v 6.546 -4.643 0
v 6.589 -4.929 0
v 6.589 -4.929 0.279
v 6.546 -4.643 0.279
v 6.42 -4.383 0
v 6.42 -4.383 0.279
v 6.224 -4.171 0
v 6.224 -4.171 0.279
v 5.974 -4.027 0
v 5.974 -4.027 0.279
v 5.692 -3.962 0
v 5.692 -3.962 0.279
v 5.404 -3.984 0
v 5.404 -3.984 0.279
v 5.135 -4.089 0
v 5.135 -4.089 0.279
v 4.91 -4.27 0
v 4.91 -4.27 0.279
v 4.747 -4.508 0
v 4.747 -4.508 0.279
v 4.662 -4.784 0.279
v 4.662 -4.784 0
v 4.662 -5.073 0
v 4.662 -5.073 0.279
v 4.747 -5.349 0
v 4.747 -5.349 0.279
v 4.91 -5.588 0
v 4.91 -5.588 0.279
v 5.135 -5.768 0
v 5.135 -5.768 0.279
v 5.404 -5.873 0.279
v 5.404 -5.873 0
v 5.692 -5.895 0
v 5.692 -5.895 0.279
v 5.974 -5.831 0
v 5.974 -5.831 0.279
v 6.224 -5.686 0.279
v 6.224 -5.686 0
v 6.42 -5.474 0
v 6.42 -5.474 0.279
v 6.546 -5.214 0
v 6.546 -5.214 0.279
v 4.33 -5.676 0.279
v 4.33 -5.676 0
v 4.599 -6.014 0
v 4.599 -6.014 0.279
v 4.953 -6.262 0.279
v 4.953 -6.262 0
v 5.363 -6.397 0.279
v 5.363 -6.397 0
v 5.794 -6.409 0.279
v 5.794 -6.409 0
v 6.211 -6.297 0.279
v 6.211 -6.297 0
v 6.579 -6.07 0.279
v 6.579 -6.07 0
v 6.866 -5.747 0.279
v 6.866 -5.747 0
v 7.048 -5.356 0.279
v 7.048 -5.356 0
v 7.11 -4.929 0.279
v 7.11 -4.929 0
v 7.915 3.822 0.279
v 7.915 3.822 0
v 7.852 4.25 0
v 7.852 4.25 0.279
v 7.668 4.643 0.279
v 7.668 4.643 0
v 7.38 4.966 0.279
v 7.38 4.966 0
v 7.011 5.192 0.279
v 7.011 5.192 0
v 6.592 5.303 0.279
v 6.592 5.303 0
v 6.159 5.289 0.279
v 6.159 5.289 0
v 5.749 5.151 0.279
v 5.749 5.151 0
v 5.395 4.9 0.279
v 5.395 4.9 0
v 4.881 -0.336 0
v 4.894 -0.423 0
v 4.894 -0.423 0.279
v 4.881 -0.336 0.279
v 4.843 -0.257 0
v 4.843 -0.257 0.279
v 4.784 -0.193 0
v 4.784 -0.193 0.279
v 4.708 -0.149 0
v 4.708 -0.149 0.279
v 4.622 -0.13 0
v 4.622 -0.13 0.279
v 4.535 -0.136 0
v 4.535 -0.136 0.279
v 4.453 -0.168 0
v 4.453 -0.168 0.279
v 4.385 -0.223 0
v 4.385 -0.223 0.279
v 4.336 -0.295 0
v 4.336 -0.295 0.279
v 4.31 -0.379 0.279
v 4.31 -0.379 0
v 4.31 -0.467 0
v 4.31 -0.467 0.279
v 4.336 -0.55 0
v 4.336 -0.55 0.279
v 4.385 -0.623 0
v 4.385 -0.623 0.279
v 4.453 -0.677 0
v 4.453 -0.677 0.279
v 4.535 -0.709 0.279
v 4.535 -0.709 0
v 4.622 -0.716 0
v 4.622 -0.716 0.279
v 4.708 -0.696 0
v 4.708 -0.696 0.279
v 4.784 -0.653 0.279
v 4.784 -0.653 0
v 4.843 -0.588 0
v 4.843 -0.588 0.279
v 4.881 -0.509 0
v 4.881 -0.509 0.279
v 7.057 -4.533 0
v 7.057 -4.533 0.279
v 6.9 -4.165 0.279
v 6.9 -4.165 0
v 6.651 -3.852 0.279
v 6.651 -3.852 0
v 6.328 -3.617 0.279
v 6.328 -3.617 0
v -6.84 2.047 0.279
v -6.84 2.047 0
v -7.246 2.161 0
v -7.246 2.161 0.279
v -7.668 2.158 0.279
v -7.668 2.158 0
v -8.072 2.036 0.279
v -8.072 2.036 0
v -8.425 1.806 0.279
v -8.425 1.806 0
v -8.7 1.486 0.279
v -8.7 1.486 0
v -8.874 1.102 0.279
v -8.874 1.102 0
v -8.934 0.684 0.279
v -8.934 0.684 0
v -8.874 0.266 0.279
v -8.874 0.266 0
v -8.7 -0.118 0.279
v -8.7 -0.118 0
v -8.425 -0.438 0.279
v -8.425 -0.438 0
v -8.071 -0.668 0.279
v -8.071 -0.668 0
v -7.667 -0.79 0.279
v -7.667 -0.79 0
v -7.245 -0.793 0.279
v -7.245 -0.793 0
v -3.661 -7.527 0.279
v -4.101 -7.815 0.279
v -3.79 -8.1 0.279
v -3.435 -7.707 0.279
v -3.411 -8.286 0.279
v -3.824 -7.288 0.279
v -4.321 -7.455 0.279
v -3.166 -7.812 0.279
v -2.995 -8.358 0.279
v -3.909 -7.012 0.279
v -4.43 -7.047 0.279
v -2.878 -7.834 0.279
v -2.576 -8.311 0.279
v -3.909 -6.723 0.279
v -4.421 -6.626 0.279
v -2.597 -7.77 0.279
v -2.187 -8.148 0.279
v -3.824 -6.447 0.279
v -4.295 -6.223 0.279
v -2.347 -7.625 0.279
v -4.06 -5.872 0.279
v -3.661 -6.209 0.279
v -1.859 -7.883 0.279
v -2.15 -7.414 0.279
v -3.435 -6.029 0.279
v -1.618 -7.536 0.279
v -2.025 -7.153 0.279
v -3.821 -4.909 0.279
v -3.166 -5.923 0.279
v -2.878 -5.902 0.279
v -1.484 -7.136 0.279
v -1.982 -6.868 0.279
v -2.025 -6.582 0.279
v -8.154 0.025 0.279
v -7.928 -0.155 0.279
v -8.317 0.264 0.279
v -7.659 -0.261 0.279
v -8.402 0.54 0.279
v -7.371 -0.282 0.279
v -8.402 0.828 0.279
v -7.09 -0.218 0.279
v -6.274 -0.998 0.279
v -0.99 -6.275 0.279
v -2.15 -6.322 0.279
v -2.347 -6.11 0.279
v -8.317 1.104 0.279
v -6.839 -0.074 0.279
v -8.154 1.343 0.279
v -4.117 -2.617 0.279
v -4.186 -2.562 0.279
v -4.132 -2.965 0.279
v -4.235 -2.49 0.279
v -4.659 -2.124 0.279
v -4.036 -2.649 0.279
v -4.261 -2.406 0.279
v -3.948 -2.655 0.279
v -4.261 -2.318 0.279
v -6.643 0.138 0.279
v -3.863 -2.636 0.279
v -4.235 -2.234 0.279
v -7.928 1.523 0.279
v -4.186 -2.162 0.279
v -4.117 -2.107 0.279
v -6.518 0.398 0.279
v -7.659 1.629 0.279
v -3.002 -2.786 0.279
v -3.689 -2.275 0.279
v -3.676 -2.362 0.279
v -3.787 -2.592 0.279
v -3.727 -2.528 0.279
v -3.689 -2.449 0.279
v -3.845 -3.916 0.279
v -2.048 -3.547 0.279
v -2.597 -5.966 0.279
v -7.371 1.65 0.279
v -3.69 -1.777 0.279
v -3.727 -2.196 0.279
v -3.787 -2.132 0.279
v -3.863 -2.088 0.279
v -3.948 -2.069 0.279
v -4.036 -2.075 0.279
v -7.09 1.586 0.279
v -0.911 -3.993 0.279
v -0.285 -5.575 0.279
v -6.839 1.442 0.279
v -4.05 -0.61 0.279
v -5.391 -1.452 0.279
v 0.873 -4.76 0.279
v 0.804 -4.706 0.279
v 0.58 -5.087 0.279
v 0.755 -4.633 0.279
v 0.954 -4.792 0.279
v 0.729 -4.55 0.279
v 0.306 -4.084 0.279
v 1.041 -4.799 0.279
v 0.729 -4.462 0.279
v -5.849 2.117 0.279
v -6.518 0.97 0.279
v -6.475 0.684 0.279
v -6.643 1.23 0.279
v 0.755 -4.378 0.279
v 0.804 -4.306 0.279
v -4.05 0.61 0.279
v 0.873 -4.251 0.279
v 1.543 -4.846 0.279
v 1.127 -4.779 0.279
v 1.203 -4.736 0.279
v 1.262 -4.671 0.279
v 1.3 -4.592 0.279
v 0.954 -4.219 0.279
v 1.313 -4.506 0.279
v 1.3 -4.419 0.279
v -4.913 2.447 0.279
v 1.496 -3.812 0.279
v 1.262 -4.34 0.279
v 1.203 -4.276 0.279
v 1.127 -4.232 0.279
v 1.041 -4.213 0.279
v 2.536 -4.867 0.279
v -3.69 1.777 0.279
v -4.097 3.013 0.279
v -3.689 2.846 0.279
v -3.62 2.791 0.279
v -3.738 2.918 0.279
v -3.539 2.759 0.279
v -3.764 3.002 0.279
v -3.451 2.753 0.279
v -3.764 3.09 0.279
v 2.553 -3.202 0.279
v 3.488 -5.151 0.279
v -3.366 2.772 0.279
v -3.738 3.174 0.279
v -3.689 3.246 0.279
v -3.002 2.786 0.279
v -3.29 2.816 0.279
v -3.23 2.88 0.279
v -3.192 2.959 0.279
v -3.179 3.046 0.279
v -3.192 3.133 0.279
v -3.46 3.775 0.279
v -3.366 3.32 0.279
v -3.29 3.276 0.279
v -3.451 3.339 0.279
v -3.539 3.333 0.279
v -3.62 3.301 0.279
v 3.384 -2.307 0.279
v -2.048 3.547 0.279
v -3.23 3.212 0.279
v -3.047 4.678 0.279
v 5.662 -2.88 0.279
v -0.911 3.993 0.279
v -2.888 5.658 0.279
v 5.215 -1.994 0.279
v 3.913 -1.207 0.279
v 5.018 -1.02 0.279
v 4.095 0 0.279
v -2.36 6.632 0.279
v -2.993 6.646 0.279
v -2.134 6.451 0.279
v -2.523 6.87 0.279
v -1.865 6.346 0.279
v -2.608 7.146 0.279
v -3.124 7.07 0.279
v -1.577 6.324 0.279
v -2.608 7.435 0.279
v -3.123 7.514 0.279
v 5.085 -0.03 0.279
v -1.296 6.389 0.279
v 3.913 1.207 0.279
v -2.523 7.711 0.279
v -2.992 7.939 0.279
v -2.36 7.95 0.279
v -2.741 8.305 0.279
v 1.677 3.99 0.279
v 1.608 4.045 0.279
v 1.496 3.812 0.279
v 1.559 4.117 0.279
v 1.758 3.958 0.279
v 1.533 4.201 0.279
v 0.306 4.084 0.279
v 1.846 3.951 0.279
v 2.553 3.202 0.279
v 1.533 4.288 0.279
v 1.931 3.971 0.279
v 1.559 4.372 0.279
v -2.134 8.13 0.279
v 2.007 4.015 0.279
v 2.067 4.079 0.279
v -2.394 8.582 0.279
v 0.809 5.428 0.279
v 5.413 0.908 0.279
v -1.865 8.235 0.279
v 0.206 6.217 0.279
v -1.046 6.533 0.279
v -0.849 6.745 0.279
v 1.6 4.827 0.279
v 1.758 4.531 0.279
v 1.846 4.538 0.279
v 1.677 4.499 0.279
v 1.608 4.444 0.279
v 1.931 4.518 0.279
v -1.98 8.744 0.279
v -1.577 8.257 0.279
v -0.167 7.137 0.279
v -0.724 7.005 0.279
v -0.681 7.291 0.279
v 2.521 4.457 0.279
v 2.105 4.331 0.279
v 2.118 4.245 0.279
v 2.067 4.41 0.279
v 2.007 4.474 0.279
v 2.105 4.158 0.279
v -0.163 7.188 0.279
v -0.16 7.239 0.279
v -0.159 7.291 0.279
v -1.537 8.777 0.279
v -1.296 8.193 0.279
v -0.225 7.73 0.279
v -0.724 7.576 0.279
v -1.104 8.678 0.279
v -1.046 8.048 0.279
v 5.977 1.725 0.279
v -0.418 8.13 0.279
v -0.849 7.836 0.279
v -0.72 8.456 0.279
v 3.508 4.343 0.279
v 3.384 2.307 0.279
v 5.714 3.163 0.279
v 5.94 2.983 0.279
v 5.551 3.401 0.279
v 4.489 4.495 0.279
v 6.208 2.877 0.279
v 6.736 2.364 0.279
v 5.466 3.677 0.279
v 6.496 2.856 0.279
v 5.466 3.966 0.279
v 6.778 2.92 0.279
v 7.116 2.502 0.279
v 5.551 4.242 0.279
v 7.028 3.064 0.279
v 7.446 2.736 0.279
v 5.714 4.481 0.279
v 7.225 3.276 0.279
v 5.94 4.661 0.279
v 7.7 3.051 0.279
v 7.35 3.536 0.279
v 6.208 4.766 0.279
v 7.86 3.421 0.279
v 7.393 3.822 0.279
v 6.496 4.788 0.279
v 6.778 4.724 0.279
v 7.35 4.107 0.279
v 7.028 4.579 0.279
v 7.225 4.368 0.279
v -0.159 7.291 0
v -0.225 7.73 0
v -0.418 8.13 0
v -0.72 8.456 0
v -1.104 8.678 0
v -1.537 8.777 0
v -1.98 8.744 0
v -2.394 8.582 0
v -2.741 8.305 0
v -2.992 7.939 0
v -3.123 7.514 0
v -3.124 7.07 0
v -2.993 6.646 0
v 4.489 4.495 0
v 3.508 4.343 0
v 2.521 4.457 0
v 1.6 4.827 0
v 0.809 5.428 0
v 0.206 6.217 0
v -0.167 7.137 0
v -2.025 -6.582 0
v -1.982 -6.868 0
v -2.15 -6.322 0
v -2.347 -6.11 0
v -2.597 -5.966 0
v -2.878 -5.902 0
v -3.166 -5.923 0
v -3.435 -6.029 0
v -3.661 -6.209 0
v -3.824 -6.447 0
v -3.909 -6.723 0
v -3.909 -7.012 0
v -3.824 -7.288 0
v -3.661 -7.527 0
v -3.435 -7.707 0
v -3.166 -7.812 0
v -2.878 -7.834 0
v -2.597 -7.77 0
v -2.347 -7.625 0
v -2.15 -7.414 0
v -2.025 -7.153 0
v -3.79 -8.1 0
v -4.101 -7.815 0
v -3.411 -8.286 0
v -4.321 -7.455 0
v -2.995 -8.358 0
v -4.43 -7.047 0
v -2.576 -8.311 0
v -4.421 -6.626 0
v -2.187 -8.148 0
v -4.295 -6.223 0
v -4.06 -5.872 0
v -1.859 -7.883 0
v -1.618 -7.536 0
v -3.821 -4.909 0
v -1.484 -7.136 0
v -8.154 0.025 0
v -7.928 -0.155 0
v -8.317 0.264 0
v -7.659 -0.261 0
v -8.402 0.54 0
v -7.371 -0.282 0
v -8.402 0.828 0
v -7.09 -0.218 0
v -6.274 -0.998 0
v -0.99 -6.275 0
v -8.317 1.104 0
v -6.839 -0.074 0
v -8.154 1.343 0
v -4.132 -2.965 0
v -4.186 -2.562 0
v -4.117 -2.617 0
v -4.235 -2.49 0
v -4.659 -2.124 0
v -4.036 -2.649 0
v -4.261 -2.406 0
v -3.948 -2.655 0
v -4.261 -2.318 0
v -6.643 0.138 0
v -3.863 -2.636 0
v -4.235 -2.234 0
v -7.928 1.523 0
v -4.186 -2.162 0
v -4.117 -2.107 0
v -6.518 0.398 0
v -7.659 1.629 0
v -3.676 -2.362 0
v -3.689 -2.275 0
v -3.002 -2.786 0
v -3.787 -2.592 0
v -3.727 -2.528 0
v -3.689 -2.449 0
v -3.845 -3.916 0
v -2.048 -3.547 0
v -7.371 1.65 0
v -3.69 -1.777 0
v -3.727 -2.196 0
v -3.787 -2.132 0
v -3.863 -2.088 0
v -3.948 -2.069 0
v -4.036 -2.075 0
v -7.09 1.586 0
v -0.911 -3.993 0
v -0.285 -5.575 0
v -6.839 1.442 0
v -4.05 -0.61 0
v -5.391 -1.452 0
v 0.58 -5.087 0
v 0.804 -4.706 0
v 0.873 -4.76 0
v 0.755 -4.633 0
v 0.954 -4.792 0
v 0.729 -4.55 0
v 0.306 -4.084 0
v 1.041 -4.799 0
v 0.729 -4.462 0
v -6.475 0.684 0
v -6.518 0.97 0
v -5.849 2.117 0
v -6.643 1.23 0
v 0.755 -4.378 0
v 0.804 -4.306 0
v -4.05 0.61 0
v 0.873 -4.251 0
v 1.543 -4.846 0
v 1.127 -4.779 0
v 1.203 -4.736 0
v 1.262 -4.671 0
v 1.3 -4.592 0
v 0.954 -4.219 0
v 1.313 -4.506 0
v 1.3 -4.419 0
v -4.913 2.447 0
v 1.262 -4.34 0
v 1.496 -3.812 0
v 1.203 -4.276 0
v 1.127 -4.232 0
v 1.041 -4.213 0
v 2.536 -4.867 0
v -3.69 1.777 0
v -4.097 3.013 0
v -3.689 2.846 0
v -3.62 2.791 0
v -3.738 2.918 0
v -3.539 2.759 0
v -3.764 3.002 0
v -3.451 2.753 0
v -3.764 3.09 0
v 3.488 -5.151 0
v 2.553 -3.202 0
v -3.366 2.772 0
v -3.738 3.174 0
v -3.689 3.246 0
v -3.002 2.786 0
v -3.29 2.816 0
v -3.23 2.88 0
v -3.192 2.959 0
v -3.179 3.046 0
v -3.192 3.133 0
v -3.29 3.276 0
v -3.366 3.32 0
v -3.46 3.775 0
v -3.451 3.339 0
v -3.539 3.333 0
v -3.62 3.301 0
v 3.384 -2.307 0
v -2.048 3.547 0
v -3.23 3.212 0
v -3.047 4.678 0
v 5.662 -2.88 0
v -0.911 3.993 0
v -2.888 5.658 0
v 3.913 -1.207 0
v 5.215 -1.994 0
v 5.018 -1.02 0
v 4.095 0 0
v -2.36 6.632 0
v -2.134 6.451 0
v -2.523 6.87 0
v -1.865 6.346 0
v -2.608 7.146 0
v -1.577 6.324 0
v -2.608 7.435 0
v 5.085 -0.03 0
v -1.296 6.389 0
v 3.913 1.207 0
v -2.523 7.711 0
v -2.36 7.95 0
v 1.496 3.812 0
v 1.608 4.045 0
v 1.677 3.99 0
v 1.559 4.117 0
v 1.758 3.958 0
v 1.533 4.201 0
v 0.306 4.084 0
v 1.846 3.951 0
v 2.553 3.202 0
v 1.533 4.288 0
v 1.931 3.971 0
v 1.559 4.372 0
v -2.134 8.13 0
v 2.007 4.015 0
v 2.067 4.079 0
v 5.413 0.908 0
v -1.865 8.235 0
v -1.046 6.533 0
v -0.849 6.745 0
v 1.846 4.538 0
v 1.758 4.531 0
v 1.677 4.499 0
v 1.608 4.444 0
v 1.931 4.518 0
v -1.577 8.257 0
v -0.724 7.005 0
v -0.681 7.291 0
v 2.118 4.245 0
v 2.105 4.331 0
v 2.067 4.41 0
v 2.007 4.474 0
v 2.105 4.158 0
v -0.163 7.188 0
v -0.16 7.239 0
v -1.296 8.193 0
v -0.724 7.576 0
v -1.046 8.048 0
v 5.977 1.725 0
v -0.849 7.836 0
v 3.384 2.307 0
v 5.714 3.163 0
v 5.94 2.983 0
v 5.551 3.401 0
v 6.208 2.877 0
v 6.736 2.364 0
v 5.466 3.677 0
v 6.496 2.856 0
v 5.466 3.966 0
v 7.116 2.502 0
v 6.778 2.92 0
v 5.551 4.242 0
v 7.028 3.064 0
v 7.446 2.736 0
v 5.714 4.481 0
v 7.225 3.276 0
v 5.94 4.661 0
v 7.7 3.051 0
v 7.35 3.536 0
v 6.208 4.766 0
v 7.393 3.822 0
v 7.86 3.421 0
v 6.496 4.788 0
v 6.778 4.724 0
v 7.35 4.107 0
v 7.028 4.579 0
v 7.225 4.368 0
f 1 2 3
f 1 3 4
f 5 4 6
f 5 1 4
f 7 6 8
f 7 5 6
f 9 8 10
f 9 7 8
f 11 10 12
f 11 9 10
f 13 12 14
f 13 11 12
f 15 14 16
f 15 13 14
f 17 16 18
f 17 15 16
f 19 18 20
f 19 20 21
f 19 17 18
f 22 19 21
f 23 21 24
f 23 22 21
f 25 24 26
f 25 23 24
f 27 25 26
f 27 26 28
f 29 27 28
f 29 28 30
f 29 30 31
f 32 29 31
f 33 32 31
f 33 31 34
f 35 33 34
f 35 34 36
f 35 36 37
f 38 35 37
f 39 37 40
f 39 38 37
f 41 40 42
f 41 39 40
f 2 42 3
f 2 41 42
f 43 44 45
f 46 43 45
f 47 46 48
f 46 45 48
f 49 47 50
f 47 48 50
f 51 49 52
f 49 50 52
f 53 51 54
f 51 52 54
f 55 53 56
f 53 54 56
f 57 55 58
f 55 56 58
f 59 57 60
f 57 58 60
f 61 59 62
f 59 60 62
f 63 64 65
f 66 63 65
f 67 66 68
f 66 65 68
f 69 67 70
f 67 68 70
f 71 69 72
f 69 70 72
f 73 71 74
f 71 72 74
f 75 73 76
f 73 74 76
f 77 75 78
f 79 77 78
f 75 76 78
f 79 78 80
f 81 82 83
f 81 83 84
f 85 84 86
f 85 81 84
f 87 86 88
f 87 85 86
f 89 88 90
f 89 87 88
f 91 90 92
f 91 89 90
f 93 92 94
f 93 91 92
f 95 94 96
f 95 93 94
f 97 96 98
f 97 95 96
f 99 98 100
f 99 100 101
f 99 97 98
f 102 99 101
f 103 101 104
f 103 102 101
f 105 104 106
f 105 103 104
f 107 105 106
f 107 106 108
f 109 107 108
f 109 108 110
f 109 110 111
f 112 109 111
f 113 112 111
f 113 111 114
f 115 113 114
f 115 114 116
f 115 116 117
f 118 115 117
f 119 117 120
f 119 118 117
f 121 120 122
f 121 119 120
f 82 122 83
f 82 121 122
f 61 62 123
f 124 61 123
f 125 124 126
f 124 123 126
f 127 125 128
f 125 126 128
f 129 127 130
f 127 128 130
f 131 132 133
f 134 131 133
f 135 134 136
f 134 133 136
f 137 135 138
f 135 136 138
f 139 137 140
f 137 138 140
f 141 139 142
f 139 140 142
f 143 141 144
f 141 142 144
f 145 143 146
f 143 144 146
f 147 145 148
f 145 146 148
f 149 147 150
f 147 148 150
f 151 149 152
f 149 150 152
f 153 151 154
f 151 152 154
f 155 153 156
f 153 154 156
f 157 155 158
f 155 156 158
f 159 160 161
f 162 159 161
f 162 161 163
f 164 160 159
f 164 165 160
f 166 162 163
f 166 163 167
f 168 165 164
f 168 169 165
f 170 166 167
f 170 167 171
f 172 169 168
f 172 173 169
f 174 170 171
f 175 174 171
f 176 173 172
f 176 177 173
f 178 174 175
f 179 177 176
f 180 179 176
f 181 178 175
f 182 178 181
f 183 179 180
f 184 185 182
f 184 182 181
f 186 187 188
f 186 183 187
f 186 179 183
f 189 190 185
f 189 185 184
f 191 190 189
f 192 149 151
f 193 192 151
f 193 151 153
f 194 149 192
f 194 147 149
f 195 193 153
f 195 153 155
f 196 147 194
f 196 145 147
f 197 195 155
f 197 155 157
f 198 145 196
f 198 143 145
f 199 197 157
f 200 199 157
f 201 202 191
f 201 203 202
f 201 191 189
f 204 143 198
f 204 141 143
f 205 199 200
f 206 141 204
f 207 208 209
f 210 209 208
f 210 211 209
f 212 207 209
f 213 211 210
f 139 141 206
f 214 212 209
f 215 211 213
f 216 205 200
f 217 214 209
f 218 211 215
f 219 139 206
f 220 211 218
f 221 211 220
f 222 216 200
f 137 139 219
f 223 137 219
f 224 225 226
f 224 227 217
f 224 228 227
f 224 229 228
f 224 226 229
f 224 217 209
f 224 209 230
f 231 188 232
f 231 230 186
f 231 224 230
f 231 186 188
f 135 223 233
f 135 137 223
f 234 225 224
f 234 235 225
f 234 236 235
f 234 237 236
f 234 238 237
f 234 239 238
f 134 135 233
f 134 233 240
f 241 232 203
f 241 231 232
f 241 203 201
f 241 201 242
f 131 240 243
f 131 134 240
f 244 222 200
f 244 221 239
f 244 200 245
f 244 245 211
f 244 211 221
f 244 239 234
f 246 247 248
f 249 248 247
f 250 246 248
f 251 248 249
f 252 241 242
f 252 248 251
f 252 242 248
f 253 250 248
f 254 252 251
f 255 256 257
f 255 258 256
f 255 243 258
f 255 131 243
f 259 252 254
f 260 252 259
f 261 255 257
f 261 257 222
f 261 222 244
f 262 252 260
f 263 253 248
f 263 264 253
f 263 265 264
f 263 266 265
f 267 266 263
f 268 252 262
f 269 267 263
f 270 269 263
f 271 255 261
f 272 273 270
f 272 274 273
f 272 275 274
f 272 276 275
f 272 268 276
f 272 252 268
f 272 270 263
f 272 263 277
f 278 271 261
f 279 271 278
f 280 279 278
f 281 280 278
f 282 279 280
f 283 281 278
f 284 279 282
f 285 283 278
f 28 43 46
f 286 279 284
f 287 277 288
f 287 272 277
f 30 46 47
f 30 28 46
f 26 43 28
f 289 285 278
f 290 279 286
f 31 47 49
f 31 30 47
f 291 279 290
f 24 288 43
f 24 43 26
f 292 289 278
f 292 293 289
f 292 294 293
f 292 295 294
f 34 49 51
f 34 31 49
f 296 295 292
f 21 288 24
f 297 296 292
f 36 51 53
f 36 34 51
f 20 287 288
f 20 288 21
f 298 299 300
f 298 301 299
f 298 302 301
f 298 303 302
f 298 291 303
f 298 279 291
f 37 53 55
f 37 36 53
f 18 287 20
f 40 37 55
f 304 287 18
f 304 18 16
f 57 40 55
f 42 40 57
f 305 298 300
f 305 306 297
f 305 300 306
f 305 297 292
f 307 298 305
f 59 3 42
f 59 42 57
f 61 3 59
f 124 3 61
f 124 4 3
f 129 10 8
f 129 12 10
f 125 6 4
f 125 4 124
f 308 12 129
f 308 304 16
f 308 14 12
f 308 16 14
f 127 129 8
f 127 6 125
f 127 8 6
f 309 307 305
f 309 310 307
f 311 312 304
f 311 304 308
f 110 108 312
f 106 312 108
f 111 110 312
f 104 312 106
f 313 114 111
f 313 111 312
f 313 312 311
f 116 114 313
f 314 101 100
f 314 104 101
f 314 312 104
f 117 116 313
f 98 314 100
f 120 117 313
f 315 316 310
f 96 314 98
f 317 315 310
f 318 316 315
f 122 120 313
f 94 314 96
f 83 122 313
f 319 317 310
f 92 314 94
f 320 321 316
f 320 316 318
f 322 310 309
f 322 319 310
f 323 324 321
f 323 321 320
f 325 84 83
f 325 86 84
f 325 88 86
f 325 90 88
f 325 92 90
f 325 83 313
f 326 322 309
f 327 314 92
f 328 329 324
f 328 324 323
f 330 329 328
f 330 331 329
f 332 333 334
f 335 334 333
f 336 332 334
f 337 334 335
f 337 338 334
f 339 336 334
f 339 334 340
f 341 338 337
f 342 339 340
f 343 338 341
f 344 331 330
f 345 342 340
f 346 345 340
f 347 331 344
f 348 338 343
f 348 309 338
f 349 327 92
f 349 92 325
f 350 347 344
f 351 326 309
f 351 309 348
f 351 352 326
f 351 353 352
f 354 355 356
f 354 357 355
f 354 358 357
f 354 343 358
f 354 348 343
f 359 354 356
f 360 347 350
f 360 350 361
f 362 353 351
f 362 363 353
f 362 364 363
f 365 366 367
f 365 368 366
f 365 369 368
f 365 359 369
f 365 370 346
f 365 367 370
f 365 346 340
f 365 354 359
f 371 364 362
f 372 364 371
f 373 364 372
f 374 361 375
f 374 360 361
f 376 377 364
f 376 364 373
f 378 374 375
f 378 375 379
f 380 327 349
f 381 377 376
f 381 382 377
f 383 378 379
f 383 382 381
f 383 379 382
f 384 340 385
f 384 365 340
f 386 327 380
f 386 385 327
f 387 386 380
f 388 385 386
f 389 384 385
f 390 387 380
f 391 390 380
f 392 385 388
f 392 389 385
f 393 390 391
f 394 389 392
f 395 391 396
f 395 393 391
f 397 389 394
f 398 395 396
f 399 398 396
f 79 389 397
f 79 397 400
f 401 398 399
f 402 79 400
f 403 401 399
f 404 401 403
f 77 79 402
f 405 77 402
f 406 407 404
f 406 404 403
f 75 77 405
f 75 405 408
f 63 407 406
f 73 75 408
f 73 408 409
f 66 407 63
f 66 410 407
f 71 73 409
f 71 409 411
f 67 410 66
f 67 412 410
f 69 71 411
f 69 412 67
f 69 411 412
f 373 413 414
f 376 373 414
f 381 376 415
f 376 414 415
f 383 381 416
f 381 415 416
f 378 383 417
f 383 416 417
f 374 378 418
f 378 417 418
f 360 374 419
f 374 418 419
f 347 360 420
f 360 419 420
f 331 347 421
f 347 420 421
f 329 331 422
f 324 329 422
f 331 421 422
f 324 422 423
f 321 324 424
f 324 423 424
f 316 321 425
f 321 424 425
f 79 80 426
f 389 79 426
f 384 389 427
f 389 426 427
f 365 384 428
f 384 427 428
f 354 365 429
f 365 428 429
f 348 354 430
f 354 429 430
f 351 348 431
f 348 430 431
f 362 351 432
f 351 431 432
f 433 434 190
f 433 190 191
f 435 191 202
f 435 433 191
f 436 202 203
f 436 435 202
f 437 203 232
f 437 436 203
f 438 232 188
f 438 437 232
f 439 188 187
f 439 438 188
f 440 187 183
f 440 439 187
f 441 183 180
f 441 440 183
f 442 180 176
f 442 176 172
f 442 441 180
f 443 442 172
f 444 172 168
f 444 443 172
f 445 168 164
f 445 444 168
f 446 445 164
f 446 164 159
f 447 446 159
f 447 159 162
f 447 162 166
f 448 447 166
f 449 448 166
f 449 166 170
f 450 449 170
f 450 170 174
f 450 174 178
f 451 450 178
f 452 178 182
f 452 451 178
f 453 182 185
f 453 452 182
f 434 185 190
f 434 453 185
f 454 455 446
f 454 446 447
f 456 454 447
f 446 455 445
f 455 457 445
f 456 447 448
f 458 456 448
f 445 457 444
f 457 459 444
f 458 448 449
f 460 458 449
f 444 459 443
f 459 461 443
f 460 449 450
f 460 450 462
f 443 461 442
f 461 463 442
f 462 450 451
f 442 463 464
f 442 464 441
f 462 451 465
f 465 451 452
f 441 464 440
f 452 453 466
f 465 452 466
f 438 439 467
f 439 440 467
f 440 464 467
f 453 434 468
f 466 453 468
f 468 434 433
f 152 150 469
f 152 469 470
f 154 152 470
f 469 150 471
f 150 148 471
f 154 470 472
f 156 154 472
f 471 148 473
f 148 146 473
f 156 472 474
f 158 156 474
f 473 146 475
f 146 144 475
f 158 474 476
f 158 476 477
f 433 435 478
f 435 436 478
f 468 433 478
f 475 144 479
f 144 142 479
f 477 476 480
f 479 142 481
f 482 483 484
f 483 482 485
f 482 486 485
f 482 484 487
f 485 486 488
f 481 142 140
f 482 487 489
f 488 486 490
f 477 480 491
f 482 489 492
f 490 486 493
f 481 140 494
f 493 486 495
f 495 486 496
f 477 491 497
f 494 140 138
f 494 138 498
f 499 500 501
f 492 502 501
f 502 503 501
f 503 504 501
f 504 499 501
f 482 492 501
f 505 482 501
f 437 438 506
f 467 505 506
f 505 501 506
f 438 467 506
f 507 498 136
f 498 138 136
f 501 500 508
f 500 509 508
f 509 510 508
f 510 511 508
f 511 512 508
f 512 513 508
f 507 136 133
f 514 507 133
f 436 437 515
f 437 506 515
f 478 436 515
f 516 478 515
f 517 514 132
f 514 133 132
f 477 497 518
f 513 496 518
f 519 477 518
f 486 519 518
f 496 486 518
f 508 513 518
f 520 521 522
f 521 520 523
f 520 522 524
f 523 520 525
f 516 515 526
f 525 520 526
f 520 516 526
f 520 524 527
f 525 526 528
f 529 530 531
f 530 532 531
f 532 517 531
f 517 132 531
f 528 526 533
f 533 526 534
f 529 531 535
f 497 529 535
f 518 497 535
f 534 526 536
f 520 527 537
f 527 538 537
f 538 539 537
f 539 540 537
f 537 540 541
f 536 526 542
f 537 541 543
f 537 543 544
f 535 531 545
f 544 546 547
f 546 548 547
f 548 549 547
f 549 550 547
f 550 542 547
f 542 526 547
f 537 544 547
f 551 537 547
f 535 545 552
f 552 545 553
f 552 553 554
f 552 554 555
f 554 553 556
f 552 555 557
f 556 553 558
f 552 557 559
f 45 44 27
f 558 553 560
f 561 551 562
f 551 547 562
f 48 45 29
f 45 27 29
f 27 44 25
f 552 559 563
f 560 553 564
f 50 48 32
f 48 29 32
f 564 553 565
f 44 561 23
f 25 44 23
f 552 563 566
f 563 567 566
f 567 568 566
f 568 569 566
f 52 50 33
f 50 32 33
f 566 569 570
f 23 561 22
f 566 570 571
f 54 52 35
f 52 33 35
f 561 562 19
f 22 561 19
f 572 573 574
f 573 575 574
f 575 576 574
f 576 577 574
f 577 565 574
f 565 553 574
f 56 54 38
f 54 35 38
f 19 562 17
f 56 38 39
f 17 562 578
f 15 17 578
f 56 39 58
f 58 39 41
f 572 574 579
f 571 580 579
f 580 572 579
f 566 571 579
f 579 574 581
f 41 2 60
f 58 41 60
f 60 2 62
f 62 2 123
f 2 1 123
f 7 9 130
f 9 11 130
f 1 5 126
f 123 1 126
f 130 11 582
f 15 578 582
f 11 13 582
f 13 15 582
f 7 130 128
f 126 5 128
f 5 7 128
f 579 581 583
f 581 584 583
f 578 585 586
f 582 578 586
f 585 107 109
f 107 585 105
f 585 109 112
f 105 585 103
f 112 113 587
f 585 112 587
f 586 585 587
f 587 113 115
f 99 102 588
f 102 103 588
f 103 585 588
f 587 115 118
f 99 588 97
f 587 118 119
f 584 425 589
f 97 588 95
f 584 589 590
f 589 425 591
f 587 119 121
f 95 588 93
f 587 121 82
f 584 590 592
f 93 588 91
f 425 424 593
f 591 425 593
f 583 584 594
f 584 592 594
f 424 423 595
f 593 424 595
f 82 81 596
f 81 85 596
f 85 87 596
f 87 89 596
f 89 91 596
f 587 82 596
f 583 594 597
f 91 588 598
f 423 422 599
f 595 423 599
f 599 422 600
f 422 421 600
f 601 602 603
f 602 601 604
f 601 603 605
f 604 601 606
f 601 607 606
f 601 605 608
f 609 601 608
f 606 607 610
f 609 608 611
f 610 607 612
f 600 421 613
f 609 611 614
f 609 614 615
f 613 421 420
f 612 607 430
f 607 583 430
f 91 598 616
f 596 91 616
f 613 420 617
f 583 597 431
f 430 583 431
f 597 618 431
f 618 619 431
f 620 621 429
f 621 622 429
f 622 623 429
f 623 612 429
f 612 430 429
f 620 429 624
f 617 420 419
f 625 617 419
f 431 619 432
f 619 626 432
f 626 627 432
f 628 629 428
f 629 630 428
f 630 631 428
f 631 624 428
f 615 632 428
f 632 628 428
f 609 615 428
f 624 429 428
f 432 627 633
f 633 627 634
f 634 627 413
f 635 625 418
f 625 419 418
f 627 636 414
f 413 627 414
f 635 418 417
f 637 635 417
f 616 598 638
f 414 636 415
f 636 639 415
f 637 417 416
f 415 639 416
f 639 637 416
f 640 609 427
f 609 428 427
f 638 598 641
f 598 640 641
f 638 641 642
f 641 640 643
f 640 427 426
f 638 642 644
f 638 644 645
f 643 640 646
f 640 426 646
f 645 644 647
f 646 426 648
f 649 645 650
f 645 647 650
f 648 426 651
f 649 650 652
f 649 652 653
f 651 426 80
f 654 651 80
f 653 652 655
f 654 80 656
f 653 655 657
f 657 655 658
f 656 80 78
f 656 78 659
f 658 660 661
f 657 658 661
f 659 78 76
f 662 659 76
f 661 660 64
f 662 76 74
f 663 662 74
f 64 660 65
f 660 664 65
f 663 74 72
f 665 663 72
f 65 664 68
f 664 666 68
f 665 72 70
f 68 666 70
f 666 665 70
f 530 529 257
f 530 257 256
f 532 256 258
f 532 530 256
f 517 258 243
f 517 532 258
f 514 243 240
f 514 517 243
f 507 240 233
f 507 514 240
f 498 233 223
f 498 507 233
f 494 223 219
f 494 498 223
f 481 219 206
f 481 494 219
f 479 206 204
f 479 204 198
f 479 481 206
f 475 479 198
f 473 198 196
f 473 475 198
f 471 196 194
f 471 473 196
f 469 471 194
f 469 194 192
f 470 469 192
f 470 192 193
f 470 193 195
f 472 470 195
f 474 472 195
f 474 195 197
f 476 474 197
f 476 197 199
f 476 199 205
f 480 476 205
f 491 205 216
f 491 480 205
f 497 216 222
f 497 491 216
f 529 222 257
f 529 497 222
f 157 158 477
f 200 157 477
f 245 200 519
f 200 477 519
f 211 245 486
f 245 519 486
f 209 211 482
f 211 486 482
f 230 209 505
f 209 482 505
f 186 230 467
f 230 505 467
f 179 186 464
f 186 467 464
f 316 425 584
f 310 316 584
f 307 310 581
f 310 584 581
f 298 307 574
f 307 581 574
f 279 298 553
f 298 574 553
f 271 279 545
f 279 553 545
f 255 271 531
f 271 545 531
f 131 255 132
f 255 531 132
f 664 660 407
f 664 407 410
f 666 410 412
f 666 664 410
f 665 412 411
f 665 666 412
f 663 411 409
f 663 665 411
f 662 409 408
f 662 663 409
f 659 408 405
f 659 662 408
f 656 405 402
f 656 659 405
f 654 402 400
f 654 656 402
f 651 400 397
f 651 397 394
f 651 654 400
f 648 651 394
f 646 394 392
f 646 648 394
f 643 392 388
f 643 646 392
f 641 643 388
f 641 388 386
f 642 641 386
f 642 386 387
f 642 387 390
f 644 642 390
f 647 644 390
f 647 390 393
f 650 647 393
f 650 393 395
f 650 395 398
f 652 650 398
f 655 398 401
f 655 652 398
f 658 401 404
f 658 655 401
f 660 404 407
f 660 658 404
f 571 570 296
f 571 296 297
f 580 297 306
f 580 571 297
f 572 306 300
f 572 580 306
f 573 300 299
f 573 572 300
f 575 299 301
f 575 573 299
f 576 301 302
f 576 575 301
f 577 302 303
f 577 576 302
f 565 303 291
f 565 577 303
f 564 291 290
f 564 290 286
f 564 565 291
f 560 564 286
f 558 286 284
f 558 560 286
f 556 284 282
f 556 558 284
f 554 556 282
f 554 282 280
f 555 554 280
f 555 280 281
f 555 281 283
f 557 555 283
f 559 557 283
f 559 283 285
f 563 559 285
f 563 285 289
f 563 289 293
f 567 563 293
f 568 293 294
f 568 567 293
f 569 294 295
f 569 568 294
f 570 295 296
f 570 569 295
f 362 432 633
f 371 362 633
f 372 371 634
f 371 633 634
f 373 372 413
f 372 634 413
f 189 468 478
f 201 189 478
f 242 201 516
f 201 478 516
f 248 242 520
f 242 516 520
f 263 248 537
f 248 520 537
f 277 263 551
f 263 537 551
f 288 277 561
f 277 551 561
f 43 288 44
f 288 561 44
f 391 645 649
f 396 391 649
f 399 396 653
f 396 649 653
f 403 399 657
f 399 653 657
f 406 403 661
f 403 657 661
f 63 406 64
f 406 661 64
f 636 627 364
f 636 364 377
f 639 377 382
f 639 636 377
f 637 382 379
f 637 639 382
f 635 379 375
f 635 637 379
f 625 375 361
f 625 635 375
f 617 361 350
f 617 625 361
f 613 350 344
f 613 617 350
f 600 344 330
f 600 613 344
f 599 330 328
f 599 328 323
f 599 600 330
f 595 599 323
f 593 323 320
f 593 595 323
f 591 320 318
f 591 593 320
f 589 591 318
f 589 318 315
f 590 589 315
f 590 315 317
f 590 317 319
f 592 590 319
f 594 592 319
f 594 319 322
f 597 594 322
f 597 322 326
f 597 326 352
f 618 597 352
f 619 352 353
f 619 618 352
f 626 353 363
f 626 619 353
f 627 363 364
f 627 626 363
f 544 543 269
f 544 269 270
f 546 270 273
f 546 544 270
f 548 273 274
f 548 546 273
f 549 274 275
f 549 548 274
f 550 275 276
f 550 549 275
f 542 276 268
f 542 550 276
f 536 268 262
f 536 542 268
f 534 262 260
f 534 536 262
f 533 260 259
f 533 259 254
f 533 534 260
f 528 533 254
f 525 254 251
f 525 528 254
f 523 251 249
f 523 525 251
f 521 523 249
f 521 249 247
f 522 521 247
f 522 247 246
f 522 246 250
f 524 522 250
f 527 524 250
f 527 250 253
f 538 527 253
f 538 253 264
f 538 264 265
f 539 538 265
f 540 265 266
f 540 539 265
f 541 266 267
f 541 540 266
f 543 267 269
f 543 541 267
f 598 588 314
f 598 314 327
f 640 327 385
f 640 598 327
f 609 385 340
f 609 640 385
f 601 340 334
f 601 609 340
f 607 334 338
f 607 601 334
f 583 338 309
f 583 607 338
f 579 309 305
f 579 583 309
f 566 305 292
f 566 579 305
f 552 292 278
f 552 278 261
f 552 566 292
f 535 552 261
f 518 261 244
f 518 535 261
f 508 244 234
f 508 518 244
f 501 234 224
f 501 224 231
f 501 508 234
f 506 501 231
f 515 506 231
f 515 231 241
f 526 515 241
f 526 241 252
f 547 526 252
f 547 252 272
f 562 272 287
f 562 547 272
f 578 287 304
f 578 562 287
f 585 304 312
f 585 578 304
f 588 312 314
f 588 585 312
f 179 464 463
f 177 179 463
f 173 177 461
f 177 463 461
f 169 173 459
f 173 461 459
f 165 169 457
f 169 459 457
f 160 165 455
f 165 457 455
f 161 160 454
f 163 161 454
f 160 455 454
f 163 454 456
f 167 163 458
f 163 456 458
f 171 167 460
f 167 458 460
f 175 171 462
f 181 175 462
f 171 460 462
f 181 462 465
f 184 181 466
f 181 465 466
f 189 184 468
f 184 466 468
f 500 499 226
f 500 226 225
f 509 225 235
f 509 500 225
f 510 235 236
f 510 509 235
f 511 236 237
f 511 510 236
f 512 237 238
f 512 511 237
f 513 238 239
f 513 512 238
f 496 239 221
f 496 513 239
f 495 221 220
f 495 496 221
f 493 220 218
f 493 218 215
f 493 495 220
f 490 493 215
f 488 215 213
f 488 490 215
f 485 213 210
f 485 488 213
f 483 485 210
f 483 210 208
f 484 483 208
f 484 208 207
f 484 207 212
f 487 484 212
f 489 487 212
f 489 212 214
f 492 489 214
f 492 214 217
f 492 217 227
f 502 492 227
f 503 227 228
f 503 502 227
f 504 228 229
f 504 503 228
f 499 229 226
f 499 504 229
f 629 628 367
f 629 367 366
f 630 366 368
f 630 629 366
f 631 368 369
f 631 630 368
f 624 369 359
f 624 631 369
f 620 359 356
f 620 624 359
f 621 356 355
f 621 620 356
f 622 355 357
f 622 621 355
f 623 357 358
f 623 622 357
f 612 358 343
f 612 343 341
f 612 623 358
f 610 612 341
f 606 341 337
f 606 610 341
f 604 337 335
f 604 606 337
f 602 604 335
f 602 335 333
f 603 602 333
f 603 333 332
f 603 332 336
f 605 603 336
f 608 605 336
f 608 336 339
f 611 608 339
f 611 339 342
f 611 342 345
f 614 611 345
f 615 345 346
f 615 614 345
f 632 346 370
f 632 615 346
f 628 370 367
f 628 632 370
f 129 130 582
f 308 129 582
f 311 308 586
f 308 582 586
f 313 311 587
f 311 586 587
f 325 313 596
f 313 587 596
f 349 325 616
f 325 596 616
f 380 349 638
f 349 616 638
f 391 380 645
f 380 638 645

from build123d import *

# Parameters (mm, degrees)
F0_R     = 0.968937
F0_R_2   = 0.293951
F0_R_3   = 4.095338
F1_DEPTH = 0.2794


with BuildPart() as f1:
    # F0 (on Top) → F1 (new body)
    with BuildSketch(Plane.XY):
        with BuildLine():
            ThreePointArc((4.330335, -5.676164), (6.006943, -6.368025), (7.110444, -4.928592))
            ThreePointArc((7.110444, -4.928592), (6.899941, -4.164898), (6.327886, -3.616909))
            ThreePointArc((6.327886, -3.616909), (4.549982, -3.890753), (4.330335, -5.676164))
        make_face()
        with Locations((5.619878, -4.928592)):
            Circle(F0_R, mode=Mode.SUBTRACT)
        with BuildLine():
            ThreePointArc((4.330335, -5.676164), (4.549982, -3.890753), (6.327886, -3.616909))
            ThreePointArc((6.327886, -3.616909), (5.018305, -0.522851), (6.7365, 2.364362))
            ThreePointArc((6.7365, 2.364362), (5.106348, 3.124981), (5.395309, 4.900491))
            ThreePointArc((5.395309, 4.900491), (2.048002, 4.611122), (-0.166949, 7.13742))
            ThreePointArc((-0.166949, 7.13742), (-1.394085, 5.822098), (-2.993402, 6.645579))
            ThreePointArc((-2.993402, 6.645579), (-3.75257, 3.372681), (-6.83968, 2.046806))
            ThreePointArc((-6.83968, 2.046806), (-6.194158, 1.496962), (-5.952965, 0.684033))
            ThreePointArc((-5.952965, 0.684033), (-6.321654, -0.297385), (-7.245333, -0.793298))
            ThreePointArc((-7.245333, -0.793298), (-4.367218, -2.52669), (-4.060206, -5.872425))
            ThreePointArc((-4.060206, -5.872425), (-2.417795, -5.475804), (-1.460165, -6.867841))
            ThreePointArc((-1.460165, -6.867841), (-1.466251, -7.002402), (-1.48446, -7.135864))
            ThreePointArc((-1.48446, -7.135864), (1.05348, -4.934261), (4.330335, -5.676164))
        make_face()
        with Locations((-3.970255, -2.362004)):
            Circle(F0_R_2, mode=Mode.SUBTRACT)
        with Locations((1.019524, -4.505836)):
            Circle(F0_R_2, mode=Mode.SUBTRACT)
        Circle(F0_R_3, mode=Mode.SUBTRACT)
        with Locations((4.600355, -0.422755)):
            Circle(F0_R_2, mode=Mode.SUBTRACT)
        with Locations((-3.473276, 3.046037)):
            Circle(F0_R_2, mode=Mode.SUBTRACT)
        with Locations((1.823652, 4.244559)):
            Circle(F0_R_2, mode=Mode.SUBTRACT)
        with BuildLine():
            ThreePointArc((5.395309, 4.900491), (5.106348, 3.124981), (6.7365, 2.364362))
            ThreePointArc((6.7365, 2.364362), (7.583226, 2.884788), (7.914573, 3.821803))
            ThreePointArc((7.914573, 3.821803), (7.010712, 5.192046), (5.395309, 4.900491))
        make_face()
        with Locations((6.424007, 3.821803)):
            Circle(F0_R, mode=Mode.SUBTRACT)
        with BuildLine():
            ThreePointArc((-4.060206, -5.872425), (-3.607157, -8.206082), (-1.48446, -7.135864))
            ThreePointArc((-1.48446, -7.135864), (-1.466251, -7.002402), (-1.460165, -6.867841))
            ThreePointArc((-1.460165, -6.867841), (-2.417795, -5.475804), (-4.060206, -5.872425))
        make_face()
        with Locations((-2.950731, -6.867841)):
            Circle(F0_R, mode=Mode.SUBTRACT)
        with BuildLine():
            ThreePointArc((-2.993402, 6.645579), (-1.394085, 5.822098), (-0.166949, 7.13742))
            ThreePointArc((-0.166949, 7.13742), (-0.161032, 7.213907), (-0.159058, 7.290596))
            ThreePointArc((-0.159058, 7.290596), (-1.980378, 8.744002), (-2.993402, 6.645579))
        make_face()
        with Locations((-1.649624, 7.290596)):
            Circle(F0_R, mode=Mode.SUBTRACT)
        with BuildLine():
            ThreePointArc((-6.83968, 2.046806), (-8.919121, 0.894792), (-7.245333, -0.793298))
            ThreePointArc((-7.245333, -0.793298), (-6.321654, -0.297385), (-5.952965, 0.684033))
            ThreePointArc((-5.952965, 0.684033), (-6.194158, 1.496962), (-6.83968, 2.046806))
        make_face()
        with Locations((-7.443531, 0.684033)):
            Circle(F0_R, mode=Mode.SUBTRACT)
    extrude(amount=F1_DEPTH)


solid = f1.part
